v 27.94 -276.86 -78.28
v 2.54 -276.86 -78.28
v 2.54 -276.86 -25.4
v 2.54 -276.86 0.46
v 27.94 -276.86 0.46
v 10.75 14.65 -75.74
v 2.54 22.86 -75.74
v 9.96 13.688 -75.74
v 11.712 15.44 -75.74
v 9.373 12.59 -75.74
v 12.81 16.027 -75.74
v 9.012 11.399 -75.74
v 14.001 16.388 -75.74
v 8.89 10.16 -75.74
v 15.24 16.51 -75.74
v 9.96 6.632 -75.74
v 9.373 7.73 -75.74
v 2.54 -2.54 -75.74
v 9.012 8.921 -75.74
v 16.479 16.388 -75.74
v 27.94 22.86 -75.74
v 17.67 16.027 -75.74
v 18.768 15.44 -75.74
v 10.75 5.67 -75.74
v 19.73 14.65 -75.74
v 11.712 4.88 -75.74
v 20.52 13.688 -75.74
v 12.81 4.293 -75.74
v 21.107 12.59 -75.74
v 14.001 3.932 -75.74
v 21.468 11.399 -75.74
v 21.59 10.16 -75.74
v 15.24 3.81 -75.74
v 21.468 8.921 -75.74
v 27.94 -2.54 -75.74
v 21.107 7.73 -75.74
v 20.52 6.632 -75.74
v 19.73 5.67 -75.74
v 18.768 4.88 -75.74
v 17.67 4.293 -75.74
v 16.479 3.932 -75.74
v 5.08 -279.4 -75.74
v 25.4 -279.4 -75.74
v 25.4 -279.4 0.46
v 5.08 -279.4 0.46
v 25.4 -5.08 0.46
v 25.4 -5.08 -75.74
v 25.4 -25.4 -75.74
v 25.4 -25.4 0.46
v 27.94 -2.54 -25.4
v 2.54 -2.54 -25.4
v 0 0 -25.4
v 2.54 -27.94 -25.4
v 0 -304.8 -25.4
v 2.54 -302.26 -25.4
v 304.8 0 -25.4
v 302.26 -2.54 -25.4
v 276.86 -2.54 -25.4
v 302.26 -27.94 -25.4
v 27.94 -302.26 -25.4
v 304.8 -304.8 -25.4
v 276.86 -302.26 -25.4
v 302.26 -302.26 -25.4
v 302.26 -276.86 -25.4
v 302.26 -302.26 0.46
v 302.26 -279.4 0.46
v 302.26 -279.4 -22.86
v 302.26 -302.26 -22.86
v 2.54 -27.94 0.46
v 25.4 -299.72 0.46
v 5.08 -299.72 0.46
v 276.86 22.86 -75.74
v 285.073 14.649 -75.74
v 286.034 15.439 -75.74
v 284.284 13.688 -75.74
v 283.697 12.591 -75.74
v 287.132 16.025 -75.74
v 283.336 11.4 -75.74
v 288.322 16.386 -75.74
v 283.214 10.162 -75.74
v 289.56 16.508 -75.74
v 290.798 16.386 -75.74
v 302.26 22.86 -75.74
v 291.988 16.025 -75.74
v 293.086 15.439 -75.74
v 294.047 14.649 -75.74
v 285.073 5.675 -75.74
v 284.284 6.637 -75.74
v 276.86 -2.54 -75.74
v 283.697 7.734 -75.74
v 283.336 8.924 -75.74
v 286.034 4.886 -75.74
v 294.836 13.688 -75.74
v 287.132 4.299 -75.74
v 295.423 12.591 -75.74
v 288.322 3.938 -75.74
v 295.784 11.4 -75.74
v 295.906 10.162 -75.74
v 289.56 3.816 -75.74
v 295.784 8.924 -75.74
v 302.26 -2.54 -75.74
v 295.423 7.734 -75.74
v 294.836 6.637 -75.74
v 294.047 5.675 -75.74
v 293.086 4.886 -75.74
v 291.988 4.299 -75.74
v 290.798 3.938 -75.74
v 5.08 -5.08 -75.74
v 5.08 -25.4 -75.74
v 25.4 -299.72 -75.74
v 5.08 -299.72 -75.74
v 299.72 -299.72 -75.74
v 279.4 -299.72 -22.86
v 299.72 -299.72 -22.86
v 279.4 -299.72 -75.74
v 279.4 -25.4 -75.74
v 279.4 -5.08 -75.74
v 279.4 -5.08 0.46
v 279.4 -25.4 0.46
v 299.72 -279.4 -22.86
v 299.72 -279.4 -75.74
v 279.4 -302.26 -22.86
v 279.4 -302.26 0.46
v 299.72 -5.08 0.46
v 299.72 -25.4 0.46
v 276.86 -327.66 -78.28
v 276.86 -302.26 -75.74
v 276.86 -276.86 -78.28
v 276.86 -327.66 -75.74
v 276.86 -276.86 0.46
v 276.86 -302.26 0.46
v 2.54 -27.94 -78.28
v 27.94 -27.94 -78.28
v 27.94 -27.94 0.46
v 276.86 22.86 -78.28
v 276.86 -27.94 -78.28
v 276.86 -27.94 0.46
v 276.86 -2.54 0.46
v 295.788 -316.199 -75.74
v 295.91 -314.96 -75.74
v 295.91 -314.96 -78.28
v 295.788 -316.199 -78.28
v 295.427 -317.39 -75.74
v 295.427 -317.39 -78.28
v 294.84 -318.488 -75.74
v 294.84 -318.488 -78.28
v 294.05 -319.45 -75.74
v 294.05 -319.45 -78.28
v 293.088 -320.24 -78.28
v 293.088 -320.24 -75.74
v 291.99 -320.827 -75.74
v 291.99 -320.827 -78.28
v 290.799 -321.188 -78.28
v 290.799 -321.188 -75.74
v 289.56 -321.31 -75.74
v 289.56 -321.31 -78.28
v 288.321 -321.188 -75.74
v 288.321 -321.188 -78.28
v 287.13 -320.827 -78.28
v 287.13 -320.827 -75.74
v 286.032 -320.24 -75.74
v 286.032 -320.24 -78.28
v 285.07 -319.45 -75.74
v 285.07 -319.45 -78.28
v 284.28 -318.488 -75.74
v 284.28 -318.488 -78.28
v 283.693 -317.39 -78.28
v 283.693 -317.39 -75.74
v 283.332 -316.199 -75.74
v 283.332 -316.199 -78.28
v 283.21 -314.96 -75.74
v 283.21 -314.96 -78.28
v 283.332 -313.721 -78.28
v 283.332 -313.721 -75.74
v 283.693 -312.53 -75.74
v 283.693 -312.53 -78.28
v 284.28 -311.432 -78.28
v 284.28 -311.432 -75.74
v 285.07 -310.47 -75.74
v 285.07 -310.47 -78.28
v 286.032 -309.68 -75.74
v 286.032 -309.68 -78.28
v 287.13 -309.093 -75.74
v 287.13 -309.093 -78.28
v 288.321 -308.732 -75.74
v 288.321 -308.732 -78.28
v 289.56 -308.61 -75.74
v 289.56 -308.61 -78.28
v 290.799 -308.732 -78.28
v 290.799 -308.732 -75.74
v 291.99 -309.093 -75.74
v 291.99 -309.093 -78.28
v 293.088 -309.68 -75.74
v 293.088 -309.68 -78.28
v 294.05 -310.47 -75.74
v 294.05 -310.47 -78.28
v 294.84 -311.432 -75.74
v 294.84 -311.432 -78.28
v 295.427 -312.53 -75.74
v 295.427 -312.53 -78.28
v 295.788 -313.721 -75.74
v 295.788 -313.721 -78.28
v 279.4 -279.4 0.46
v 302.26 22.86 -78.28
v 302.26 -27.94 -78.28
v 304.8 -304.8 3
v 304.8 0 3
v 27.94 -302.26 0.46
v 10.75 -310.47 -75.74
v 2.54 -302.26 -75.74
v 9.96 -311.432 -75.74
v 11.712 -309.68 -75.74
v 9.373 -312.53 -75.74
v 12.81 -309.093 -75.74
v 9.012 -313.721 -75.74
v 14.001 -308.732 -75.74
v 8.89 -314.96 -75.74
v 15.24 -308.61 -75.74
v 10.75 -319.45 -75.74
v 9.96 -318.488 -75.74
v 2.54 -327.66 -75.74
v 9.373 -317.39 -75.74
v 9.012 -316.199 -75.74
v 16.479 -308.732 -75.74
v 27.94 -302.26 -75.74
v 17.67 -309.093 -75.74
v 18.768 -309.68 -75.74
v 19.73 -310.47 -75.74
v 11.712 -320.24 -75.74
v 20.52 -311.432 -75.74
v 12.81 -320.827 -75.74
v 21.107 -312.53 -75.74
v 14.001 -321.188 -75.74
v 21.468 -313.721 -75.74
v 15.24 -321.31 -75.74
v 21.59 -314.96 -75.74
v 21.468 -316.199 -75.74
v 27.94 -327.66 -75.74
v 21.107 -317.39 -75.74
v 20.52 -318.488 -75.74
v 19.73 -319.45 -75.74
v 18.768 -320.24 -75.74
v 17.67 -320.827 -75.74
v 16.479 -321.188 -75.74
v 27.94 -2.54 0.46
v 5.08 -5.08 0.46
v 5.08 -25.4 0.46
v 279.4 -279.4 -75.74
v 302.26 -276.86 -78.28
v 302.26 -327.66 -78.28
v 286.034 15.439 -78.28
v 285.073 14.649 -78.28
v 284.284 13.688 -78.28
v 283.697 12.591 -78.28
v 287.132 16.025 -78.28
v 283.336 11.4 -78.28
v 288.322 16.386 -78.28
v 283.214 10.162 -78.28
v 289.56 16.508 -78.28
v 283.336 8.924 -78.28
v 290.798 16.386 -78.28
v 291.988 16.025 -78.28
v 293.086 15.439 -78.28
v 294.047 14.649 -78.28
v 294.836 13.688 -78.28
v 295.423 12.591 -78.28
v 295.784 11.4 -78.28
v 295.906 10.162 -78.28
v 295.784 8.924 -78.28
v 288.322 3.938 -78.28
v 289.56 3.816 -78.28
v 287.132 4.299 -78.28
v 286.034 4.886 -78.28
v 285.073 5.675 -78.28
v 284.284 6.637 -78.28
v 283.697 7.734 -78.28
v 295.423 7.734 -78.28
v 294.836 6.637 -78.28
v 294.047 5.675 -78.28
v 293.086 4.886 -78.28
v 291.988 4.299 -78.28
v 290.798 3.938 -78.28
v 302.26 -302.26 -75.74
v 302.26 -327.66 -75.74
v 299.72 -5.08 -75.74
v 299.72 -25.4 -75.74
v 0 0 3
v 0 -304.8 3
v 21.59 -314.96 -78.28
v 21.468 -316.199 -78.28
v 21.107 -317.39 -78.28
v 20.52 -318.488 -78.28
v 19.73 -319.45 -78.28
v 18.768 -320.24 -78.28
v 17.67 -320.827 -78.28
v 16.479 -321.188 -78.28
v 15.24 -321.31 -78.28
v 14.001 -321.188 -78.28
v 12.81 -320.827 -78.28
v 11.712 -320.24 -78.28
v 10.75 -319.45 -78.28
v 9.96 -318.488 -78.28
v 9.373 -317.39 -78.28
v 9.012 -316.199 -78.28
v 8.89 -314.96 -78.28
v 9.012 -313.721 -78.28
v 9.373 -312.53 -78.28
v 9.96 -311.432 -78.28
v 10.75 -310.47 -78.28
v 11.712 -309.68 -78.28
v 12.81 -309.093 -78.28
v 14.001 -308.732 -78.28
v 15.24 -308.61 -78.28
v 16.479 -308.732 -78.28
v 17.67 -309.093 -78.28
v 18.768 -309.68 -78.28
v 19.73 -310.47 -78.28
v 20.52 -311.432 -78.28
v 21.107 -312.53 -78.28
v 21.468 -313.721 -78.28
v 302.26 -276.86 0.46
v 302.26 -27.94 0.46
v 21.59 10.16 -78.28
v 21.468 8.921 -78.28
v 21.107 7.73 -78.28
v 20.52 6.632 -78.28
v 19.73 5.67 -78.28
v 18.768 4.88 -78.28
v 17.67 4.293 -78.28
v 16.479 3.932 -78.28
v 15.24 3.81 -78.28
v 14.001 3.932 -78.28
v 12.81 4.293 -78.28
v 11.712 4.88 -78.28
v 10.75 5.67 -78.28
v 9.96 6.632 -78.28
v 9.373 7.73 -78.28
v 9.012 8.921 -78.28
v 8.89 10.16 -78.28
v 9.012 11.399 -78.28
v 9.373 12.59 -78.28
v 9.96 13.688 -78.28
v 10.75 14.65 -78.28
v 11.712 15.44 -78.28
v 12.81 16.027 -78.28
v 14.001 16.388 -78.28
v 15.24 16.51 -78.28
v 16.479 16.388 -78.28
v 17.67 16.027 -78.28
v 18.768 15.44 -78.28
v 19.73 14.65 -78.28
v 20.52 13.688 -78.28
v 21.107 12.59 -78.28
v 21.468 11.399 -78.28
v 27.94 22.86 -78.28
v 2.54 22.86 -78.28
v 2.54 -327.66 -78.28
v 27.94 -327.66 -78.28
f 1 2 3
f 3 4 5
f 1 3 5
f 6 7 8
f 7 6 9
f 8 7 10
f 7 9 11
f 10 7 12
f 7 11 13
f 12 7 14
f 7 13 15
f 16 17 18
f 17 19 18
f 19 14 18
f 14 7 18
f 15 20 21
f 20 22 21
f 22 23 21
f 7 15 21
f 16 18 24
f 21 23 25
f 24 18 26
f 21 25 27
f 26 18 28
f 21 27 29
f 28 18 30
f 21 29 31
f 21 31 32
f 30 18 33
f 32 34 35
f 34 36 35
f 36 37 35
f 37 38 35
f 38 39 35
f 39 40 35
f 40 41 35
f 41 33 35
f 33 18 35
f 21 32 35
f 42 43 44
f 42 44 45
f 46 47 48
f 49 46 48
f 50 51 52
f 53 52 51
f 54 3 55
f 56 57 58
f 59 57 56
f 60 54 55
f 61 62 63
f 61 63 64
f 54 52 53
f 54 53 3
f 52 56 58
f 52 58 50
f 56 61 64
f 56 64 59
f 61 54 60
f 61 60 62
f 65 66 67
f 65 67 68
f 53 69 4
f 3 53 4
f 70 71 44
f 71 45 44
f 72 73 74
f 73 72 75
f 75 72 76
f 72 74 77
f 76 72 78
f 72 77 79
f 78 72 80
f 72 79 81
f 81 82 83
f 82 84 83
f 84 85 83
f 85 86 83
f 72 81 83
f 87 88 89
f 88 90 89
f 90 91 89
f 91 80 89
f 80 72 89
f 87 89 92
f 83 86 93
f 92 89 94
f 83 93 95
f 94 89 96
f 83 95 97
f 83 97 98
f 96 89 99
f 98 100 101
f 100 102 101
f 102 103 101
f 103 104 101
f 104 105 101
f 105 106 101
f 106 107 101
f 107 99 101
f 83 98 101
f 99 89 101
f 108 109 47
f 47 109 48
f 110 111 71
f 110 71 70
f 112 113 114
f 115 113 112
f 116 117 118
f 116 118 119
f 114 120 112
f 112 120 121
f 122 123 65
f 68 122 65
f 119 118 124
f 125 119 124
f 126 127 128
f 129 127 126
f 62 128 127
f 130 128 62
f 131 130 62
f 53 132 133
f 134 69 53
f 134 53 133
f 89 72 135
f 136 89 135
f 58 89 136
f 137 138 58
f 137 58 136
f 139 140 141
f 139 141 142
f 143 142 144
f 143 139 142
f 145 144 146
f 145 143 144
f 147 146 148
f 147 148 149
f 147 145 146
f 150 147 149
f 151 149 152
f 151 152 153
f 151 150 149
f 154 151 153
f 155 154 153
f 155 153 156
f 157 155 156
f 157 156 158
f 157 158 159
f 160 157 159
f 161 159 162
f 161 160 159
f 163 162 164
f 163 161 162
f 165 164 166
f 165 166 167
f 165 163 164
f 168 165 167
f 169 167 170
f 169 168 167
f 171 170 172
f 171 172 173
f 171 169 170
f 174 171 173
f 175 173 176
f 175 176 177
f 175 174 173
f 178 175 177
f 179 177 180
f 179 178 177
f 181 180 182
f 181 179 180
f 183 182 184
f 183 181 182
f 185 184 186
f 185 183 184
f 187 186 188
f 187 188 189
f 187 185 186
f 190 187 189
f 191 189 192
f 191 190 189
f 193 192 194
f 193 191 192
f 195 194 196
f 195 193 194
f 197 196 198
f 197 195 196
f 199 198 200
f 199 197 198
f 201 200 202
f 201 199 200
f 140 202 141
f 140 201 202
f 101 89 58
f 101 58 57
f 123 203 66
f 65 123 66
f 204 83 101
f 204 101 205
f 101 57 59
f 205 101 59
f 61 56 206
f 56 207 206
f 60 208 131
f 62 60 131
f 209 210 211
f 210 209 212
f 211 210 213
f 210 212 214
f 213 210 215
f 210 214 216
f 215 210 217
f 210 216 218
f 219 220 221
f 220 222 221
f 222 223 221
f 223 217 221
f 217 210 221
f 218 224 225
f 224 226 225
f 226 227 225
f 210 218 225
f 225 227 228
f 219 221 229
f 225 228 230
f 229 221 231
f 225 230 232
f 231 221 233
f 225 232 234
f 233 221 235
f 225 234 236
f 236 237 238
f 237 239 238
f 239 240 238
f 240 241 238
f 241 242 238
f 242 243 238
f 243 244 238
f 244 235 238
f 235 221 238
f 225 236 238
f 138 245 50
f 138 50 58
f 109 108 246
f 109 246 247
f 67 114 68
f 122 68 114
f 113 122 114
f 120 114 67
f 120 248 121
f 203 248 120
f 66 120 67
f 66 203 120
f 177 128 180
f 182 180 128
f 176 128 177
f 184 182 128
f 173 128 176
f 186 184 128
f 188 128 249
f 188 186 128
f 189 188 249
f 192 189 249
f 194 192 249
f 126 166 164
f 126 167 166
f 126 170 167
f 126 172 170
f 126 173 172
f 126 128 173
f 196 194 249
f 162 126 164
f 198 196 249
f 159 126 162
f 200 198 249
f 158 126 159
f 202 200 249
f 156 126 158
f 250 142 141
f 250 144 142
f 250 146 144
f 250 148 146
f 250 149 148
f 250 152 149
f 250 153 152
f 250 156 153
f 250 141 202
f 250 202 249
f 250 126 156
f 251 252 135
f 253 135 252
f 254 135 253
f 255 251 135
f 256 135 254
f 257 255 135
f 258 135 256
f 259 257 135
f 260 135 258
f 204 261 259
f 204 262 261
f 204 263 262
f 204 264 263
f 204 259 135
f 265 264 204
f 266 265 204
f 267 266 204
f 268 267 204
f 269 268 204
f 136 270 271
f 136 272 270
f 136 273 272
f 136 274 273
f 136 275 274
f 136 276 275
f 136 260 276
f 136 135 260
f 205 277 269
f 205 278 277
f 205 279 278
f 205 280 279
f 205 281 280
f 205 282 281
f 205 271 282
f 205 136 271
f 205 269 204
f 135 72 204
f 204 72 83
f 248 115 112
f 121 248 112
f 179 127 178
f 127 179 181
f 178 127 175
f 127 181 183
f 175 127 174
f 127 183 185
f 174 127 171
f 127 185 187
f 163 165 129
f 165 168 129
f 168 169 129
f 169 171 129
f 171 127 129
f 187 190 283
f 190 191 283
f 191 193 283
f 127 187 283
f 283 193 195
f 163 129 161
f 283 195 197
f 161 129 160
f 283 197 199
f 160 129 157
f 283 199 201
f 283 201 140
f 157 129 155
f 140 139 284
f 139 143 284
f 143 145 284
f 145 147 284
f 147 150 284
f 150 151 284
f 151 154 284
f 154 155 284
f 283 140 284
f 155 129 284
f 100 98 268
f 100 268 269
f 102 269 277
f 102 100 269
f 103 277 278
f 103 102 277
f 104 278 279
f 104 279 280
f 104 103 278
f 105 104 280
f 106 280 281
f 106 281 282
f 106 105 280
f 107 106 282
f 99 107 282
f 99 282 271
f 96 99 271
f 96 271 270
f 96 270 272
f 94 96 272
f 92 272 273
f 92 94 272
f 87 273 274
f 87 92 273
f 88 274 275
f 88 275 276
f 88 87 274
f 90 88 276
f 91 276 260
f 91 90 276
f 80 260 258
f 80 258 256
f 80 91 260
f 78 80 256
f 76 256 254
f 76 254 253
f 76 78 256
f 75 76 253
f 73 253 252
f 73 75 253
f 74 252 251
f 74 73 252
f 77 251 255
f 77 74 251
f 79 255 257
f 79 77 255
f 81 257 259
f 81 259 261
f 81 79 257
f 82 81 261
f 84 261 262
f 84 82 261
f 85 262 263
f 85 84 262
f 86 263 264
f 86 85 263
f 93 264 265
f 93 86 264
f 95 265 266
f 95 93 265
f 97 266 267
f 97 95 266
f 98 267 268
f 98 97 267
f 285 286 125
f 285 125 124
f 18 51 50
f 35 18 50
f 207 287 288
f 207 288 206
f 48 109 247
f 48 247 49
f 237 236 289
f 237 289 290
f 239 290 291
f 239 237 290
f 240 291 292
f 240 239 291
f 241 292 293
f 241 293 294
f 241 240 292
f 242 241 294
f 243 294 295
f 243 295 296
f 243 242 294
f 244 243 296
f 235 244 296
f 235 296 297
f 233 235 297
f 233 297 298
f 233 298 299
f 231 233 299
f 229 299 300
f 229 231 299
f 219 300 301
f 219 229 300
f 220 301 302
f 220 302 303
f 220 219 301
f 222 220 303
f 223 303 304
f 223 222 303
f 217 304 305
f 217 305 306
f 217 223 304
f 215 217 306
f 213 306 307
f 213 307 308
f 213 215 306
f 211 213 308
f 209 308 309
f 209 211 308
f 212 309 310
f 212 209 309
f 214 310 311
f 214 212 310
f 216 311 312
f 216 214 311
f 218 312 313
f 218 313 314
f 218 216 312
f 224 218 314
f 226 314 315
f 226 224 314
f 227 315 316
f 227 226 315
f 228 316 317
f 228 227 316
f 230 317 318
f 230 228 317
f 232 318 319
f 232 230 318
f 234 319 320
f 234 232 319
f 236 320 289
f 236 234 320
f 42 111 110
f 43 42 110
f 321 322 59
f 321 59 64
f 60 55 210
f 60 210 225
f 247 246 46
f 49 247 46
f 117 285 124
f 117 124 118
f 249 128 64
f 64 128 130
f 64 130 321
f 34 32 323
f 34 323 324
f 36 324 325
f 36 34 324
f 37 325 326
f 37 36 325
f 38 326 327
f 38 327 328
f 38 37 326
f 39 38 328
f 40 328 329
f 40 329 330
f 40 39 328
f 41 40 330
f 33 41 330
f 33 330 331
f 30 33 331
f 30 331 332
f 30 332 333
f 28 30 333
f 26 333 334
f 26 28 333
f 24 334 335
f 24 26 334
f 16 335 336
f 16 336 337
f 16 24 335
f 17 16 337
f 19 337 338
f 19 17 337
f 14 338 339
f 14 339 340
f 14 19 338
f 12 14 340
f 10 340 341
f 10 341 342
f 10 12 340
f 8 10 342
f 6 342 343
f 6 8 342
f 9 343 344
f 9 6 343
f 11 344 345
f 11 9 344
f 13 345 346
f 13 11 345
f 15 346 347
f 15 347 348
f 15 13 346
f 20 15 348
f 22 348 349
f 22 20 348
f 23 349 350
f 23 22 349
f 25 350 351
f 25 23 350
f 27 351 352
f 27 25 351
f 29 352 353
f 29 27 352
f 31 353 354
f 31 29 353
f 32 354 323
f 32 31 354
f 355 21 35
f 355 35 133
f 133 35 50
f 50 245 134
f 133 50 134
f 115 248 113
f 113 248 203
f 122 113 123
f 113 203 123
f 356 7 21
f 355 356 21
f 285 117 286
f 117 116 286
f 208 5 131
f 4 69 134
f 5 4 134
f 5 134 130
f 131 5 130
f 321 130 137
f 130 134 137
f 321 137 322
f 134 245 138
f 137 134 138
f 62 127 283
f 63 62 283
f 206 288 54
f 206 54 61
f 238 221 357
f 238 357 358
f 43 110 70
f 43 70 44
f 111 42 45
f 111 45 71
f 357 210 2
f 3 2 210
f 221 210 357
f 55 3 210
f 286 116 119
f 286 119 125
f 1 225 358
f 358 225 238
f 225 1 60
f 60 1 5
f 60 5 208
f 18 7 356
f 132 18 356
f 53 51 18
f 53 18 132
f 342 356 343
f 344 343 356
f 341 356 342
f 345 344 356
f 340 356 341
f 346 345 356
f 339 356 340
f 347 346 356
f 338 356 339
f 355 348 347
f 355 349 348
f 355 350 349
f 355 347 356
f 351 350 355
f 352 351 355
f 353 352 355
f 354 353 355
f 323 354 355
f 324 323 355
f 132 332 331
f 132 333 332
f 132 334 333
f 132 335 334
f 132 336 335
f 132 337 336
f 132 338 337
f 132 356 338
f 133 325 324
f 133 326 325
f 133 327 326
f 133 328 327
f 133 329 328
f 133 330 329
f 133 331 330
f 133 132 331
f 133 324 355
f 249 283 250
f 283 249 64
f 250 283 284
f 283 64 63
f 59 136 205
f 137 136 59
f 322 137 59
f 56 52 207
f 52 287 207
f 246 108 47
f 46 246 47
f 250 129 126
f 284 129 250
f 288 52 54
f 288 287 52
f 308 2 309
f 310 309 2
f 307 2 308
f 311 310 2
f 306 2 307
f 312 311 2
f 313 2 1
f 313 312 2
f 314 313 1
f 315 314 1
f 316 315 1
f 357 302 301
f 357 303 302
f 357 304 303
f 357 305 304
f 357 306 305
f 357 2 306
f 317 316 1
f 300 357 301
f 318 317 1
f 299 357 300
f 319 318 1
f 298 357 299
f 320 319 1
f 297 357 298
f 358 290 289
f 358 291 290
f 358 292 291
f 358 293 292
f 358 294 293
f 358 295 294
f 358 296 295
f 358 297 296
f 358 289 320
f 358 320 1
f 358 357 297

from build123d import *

# Parameters (mm, degrees)
F0_W         = 304.8
F0_H         = 304.8
F1_DEPTH     = 3
F2_W         = 304.8
F2_H         = 304.8
F3_DEPTH     = 25.4
F4_T         = -2.54
F5_W         = 25.4
F5_H         = 25.4
F6_DEPTH     = 76.2
F7_T         = 2.54
F7_T3_DEPTH  = 30.48
F7_T5_DEPTH  = 30.48
F7_T7_DEPTH  = 30.94
F7_T9_DEPTH  = 304.8
F7_T11_DEPTH = 279.4
F7_T13_DEPTH = 279.4
F7_T15_DEPTH = 304.8
F8_W         = 25.4
F8_H         = 25.4
F8_W_2       = 20.32
F8_H_2       = 20.32
F9_DEPTH     = 76.2
F10_W        = 25.4
F10_H        = 50.8
F10_R        = 6.3459053742
F11_DEPTH    = 2.54
F12_W        = 25.4
F12_H        = 50.8
F12_R        = 6.35
F13_DEPTH    = 2.54
F14_W        = 25.4
F14_H        = 50.8
F14_R        = 6.35
F15_DEPTH    = 2.54
F16_W        = 25.4
F16_H        = 50.8
F16_R        = 6.35
F17_DEPTH    = 2.54


# Not quite as in the source:
# - a shell that OpenCascade refuses in one call is made with other operations: the cavity is built on its own and cut out


with BuildPart() as f1:
    # F0 (on Top) → F1 (new body)
    with BuildSketch(Plane.XY):
        with Locations((152.4, -152.4)):
            Rectangle(F0_W, F0_H)
    extrude(amount=F1_DEPTH)

    # F2 (on face) → F3 (join)
    with BuildSketch(Plane(origin=(0, 0, 0), x_dir=(1, 0, 0), z_dir=(0, 0, -1))):
        with Locations((152.4, 152.4)):
            Rectangle(F2_W, F2_H)
    extrude(amount=F3_DEPTH)

    # F4
    f4_openings = [f1.faces().sort_by_distance(p)[0] for p in [
        (152.4, -152.4, -25.4),
    ]]
    offset(amount=F4_T, openings=f4_openings)

    # F5 (on face) → F6 (join)
    with BuildSketch(Plane(origin=(0, 0, 0.46), x_dir=(1, 0, 0), z_dir=(0, 0, -1))):
        with Locations((289.56, 289.56)):
            Rectangle(F5_W, F5_H)
    extrude(amount=F6_DEPTH)

    # F7: shell of thickness 2.54, made by hand


with BuildPart() as f7_core1:
    # F7_t2: copy of F1
    add(f1.part)

    # the walls: a layer under each face that stays
    f7_faces = [f7_core1.faces().sort_by_distance(p)[0] for p in [
        (152.4, -304.8, -11.2),
        (152.4, -152.4, 3),
        (304.8, -152.4, -11.2),
        (2.38125, -120.4148148148, -25.4),
        (0, -152.4, -11.2),
        (152.4, 0, -11.2),
        (2.54, -152.4, -12.47),
        (289.56, -302.26, -50.57),
        (139.7, -302.26, -12.47),
        (302.26, -139.7, -12.47),
        (302.26, -289.56, -50.57),
        (152.4, -2.54, -12.47),
        (152.4, -152.4, 0.46),
        (276.86, -289.56, -37.64),
        (289.56, -276.86, -37.64),
    ]]
    thicken(f7_faces, amount=-F7_T, mode=Mode.SUBTRACT)

    # F7_s4 → F7_t3 (cut)
    with BuildSketch(Plane.YZ.offset(274.32)):
        Polygon((-302.2854, -25.4254), (-302.26, -22.86), (-299.72, -22.86), (-299.72, -25.4), align=None)
        Polygon((-276.8346, 0.4346), (-276.86, 3), (-279.4, 3), (-279.4, 0.46), align=None)
    extrude(amount=F7_T3_DEPTH, mode=Mode.SUBTRACT)

    # F7_s6 → F7_t5 (cut)
    with BuildSketch(Plane.XZ.offset(274.32)):
        Polygon((302.2854, -25.4254), (302.26, -22.86), (299.72, -22.86), (299.72, -25.4), align=None)
        Polygon((276.8346, 0.4346), (276.86, 3), (279.4, 3), (279.4, 0.46), align=None)
    extrude(amount=F7_T5_DEPTH, mode=Mode.SUBTRACT)

    # F7_s8 → F7_t7 (cut)
    with BuildSketch(Plane.XY.offset(-27.94)):
        Polygon((2.5654, -2.5654), (0, -2.54), (0, 0), (2.54, 0), align=None)
        Polygon((2.5654, -302.2346), (0, -302.26), (0, -304.8), (2.54, -304.8), align=None)
        Polygon((276.8346, -302.2346), (276.86, -304.8), (279.4, -304.8), (279.4, -302.26), align=None)
        Polygon((302.2346, -2.5654), (304.8, -2.54), (304.8, 0), (302.26, 0), align=None)
        Polygon((302.2346, -276.8346), (304.8, -276.86), (304.8, -279.4), (302.26, -279.4), align=None)
    extrude(amount=F7_T7_DEPTH, mode=Mode.SUBTRACT)

    # F7_s10 → F7_t9 (cut)
    with BuildSketch(Plane.XZ):
        Polygon((2.5654, 0.4346), (0, 0.46), (0, 3), (2.54, 3), align=None)
    extrude(amount=F7_T9_DEPTH, mode=Mode.SUBTRACT)

    # F7_s12 → F7_t11 (cut)
    with BuildSketch(Plane.YZ):
        Polygon((-302.2346, 0.4346), (-304.8, 0.46), (-304.8, 3), (-302.26, 3), align=None)
    extrude(amount=F7_T11_DEPTH, mode=Mode.SUBTRACT)

    # F7_s14 → F7_t13 (cut)
    with BuildSketch(Plane.XZ):
        Polygon((302.2346, 0.4346), (304.8, 0.46), (304.8, 3), (302.26, 3), align=None)
    extrude(amount=F7_T13_DEPTH, mode=Mode.SUBTRACT)

    # F7_s16 → F7_t15 (cut)
    with BuildSketch(Plane.YZ):
        Polygon((-2.5654, 0.4346), (0, 0.46), (0, 3), (-2.54, 3), align=None)
    extrude(amount=F7_T15_DEPTH, mode=Mode.SUBTRACT)


with BuildPart() as f1_1:
    add(f1.part)

    # what is left inside the walls is the cavity
    f7_cavity = [f7_core1.part.solids().sort_by_distance(p)[0] for p in [
        (290.83, -279.4254, -50.34),
    ]]
    add(f7_cavity, mode=Mode.SUBTRACT)

    # F8 (on face) → F9 (join)
    with BuildSketch(Plane(origin=(0, 0, 0.46), x_dir=(1, 0, 0), z_dir=(0, 0, -1))):
        with Locations((15.24, 15.24)):
            Rectangle(F8_W, F8_H)
        with Locations((15.24, 15.24)):
            Rectangle(F8_W_2, F8_H_2, mode=Mode.SUBTRACT)
        with Locations((289.56, 15.24)):
            Rectangle(F8_W, F8_H)
        Polygon((279.4, 5.08), (279.4, 15.24), (279.4, 25.4), (299.72, 25.4), (299.72, 5.08), align=None, mode=Mode.SUBTRACT)
        with Locations((15.24, 289.56)):
            Rectangle(F8_W, F8_H)
        Polygon((25.4, 279.4), (15.24, 279.4), (5.08, 279.4), (5.08, 299.72), (25.4, 299.72), align=None, mode=Mode.SUBTRACT)
    extrude(amount=F9_DEPTH)

    # F10 (on face) → F11 (join)
    with BuildSketch(Plane(origin=(0, 0, -75.74), x_dir=(1, 0, 0), z_dir=(0, 0, -1))):
        with Locations((289.56, 2.54)):
            Rectangle(F10_W, F10_H)
        with Locations((289.56, -10.1621253416)):
            Circle(F10_R, mode=Mode.SUBTRACT)
    extrude(amount=F11_DEPTH)

    # F12 (on face) → F13 (join)
    with BuildSketch(Plane(origin=(0, 0, -75.74), x_dir=(1, 0, 0), z_dir=(0, 0, -1))):
        with Locations((15.24, 2.54)):
            Rectangle(F12_W, F12_H)
        with Locations((15.24, -10.16)):
            Circle(F12_R, mode=Mode.SUBTRACT)
    extrude(amount=F13_DEPTH)

    # F14 (on face) → F15 (join)
    with BuildSketch(Plane(origin=(0, 0, -75.74), x_dir=(1, 0, 0), z_dir=(0, 0, -1))):
        with Locations((15.24, 302.26)):
            Rectangle(F14_W, F14_H)
        with Locations((15.24, 314.96)):
            Circle(F14_R, mode=Mode.SUBTRACT)
    extrude(amount=F15_DEPTH)

    # F16 (on face) → F17 (join)
    with BuildSketch(Plane(origin=(0, 0, -75.74), x_dir=(1, 0, 0), z_dir=(0, 0, -1))):
        with Locations((289.56, 302.26)):
            Rectangle(F16_W, F16_H)
        with Locations((289.56, 314.96)):
            Circle(F16_R, mode=Mode.SUBTRACT)
    extrude(amount=F17_DEPTH)


solid = f1_1.part
